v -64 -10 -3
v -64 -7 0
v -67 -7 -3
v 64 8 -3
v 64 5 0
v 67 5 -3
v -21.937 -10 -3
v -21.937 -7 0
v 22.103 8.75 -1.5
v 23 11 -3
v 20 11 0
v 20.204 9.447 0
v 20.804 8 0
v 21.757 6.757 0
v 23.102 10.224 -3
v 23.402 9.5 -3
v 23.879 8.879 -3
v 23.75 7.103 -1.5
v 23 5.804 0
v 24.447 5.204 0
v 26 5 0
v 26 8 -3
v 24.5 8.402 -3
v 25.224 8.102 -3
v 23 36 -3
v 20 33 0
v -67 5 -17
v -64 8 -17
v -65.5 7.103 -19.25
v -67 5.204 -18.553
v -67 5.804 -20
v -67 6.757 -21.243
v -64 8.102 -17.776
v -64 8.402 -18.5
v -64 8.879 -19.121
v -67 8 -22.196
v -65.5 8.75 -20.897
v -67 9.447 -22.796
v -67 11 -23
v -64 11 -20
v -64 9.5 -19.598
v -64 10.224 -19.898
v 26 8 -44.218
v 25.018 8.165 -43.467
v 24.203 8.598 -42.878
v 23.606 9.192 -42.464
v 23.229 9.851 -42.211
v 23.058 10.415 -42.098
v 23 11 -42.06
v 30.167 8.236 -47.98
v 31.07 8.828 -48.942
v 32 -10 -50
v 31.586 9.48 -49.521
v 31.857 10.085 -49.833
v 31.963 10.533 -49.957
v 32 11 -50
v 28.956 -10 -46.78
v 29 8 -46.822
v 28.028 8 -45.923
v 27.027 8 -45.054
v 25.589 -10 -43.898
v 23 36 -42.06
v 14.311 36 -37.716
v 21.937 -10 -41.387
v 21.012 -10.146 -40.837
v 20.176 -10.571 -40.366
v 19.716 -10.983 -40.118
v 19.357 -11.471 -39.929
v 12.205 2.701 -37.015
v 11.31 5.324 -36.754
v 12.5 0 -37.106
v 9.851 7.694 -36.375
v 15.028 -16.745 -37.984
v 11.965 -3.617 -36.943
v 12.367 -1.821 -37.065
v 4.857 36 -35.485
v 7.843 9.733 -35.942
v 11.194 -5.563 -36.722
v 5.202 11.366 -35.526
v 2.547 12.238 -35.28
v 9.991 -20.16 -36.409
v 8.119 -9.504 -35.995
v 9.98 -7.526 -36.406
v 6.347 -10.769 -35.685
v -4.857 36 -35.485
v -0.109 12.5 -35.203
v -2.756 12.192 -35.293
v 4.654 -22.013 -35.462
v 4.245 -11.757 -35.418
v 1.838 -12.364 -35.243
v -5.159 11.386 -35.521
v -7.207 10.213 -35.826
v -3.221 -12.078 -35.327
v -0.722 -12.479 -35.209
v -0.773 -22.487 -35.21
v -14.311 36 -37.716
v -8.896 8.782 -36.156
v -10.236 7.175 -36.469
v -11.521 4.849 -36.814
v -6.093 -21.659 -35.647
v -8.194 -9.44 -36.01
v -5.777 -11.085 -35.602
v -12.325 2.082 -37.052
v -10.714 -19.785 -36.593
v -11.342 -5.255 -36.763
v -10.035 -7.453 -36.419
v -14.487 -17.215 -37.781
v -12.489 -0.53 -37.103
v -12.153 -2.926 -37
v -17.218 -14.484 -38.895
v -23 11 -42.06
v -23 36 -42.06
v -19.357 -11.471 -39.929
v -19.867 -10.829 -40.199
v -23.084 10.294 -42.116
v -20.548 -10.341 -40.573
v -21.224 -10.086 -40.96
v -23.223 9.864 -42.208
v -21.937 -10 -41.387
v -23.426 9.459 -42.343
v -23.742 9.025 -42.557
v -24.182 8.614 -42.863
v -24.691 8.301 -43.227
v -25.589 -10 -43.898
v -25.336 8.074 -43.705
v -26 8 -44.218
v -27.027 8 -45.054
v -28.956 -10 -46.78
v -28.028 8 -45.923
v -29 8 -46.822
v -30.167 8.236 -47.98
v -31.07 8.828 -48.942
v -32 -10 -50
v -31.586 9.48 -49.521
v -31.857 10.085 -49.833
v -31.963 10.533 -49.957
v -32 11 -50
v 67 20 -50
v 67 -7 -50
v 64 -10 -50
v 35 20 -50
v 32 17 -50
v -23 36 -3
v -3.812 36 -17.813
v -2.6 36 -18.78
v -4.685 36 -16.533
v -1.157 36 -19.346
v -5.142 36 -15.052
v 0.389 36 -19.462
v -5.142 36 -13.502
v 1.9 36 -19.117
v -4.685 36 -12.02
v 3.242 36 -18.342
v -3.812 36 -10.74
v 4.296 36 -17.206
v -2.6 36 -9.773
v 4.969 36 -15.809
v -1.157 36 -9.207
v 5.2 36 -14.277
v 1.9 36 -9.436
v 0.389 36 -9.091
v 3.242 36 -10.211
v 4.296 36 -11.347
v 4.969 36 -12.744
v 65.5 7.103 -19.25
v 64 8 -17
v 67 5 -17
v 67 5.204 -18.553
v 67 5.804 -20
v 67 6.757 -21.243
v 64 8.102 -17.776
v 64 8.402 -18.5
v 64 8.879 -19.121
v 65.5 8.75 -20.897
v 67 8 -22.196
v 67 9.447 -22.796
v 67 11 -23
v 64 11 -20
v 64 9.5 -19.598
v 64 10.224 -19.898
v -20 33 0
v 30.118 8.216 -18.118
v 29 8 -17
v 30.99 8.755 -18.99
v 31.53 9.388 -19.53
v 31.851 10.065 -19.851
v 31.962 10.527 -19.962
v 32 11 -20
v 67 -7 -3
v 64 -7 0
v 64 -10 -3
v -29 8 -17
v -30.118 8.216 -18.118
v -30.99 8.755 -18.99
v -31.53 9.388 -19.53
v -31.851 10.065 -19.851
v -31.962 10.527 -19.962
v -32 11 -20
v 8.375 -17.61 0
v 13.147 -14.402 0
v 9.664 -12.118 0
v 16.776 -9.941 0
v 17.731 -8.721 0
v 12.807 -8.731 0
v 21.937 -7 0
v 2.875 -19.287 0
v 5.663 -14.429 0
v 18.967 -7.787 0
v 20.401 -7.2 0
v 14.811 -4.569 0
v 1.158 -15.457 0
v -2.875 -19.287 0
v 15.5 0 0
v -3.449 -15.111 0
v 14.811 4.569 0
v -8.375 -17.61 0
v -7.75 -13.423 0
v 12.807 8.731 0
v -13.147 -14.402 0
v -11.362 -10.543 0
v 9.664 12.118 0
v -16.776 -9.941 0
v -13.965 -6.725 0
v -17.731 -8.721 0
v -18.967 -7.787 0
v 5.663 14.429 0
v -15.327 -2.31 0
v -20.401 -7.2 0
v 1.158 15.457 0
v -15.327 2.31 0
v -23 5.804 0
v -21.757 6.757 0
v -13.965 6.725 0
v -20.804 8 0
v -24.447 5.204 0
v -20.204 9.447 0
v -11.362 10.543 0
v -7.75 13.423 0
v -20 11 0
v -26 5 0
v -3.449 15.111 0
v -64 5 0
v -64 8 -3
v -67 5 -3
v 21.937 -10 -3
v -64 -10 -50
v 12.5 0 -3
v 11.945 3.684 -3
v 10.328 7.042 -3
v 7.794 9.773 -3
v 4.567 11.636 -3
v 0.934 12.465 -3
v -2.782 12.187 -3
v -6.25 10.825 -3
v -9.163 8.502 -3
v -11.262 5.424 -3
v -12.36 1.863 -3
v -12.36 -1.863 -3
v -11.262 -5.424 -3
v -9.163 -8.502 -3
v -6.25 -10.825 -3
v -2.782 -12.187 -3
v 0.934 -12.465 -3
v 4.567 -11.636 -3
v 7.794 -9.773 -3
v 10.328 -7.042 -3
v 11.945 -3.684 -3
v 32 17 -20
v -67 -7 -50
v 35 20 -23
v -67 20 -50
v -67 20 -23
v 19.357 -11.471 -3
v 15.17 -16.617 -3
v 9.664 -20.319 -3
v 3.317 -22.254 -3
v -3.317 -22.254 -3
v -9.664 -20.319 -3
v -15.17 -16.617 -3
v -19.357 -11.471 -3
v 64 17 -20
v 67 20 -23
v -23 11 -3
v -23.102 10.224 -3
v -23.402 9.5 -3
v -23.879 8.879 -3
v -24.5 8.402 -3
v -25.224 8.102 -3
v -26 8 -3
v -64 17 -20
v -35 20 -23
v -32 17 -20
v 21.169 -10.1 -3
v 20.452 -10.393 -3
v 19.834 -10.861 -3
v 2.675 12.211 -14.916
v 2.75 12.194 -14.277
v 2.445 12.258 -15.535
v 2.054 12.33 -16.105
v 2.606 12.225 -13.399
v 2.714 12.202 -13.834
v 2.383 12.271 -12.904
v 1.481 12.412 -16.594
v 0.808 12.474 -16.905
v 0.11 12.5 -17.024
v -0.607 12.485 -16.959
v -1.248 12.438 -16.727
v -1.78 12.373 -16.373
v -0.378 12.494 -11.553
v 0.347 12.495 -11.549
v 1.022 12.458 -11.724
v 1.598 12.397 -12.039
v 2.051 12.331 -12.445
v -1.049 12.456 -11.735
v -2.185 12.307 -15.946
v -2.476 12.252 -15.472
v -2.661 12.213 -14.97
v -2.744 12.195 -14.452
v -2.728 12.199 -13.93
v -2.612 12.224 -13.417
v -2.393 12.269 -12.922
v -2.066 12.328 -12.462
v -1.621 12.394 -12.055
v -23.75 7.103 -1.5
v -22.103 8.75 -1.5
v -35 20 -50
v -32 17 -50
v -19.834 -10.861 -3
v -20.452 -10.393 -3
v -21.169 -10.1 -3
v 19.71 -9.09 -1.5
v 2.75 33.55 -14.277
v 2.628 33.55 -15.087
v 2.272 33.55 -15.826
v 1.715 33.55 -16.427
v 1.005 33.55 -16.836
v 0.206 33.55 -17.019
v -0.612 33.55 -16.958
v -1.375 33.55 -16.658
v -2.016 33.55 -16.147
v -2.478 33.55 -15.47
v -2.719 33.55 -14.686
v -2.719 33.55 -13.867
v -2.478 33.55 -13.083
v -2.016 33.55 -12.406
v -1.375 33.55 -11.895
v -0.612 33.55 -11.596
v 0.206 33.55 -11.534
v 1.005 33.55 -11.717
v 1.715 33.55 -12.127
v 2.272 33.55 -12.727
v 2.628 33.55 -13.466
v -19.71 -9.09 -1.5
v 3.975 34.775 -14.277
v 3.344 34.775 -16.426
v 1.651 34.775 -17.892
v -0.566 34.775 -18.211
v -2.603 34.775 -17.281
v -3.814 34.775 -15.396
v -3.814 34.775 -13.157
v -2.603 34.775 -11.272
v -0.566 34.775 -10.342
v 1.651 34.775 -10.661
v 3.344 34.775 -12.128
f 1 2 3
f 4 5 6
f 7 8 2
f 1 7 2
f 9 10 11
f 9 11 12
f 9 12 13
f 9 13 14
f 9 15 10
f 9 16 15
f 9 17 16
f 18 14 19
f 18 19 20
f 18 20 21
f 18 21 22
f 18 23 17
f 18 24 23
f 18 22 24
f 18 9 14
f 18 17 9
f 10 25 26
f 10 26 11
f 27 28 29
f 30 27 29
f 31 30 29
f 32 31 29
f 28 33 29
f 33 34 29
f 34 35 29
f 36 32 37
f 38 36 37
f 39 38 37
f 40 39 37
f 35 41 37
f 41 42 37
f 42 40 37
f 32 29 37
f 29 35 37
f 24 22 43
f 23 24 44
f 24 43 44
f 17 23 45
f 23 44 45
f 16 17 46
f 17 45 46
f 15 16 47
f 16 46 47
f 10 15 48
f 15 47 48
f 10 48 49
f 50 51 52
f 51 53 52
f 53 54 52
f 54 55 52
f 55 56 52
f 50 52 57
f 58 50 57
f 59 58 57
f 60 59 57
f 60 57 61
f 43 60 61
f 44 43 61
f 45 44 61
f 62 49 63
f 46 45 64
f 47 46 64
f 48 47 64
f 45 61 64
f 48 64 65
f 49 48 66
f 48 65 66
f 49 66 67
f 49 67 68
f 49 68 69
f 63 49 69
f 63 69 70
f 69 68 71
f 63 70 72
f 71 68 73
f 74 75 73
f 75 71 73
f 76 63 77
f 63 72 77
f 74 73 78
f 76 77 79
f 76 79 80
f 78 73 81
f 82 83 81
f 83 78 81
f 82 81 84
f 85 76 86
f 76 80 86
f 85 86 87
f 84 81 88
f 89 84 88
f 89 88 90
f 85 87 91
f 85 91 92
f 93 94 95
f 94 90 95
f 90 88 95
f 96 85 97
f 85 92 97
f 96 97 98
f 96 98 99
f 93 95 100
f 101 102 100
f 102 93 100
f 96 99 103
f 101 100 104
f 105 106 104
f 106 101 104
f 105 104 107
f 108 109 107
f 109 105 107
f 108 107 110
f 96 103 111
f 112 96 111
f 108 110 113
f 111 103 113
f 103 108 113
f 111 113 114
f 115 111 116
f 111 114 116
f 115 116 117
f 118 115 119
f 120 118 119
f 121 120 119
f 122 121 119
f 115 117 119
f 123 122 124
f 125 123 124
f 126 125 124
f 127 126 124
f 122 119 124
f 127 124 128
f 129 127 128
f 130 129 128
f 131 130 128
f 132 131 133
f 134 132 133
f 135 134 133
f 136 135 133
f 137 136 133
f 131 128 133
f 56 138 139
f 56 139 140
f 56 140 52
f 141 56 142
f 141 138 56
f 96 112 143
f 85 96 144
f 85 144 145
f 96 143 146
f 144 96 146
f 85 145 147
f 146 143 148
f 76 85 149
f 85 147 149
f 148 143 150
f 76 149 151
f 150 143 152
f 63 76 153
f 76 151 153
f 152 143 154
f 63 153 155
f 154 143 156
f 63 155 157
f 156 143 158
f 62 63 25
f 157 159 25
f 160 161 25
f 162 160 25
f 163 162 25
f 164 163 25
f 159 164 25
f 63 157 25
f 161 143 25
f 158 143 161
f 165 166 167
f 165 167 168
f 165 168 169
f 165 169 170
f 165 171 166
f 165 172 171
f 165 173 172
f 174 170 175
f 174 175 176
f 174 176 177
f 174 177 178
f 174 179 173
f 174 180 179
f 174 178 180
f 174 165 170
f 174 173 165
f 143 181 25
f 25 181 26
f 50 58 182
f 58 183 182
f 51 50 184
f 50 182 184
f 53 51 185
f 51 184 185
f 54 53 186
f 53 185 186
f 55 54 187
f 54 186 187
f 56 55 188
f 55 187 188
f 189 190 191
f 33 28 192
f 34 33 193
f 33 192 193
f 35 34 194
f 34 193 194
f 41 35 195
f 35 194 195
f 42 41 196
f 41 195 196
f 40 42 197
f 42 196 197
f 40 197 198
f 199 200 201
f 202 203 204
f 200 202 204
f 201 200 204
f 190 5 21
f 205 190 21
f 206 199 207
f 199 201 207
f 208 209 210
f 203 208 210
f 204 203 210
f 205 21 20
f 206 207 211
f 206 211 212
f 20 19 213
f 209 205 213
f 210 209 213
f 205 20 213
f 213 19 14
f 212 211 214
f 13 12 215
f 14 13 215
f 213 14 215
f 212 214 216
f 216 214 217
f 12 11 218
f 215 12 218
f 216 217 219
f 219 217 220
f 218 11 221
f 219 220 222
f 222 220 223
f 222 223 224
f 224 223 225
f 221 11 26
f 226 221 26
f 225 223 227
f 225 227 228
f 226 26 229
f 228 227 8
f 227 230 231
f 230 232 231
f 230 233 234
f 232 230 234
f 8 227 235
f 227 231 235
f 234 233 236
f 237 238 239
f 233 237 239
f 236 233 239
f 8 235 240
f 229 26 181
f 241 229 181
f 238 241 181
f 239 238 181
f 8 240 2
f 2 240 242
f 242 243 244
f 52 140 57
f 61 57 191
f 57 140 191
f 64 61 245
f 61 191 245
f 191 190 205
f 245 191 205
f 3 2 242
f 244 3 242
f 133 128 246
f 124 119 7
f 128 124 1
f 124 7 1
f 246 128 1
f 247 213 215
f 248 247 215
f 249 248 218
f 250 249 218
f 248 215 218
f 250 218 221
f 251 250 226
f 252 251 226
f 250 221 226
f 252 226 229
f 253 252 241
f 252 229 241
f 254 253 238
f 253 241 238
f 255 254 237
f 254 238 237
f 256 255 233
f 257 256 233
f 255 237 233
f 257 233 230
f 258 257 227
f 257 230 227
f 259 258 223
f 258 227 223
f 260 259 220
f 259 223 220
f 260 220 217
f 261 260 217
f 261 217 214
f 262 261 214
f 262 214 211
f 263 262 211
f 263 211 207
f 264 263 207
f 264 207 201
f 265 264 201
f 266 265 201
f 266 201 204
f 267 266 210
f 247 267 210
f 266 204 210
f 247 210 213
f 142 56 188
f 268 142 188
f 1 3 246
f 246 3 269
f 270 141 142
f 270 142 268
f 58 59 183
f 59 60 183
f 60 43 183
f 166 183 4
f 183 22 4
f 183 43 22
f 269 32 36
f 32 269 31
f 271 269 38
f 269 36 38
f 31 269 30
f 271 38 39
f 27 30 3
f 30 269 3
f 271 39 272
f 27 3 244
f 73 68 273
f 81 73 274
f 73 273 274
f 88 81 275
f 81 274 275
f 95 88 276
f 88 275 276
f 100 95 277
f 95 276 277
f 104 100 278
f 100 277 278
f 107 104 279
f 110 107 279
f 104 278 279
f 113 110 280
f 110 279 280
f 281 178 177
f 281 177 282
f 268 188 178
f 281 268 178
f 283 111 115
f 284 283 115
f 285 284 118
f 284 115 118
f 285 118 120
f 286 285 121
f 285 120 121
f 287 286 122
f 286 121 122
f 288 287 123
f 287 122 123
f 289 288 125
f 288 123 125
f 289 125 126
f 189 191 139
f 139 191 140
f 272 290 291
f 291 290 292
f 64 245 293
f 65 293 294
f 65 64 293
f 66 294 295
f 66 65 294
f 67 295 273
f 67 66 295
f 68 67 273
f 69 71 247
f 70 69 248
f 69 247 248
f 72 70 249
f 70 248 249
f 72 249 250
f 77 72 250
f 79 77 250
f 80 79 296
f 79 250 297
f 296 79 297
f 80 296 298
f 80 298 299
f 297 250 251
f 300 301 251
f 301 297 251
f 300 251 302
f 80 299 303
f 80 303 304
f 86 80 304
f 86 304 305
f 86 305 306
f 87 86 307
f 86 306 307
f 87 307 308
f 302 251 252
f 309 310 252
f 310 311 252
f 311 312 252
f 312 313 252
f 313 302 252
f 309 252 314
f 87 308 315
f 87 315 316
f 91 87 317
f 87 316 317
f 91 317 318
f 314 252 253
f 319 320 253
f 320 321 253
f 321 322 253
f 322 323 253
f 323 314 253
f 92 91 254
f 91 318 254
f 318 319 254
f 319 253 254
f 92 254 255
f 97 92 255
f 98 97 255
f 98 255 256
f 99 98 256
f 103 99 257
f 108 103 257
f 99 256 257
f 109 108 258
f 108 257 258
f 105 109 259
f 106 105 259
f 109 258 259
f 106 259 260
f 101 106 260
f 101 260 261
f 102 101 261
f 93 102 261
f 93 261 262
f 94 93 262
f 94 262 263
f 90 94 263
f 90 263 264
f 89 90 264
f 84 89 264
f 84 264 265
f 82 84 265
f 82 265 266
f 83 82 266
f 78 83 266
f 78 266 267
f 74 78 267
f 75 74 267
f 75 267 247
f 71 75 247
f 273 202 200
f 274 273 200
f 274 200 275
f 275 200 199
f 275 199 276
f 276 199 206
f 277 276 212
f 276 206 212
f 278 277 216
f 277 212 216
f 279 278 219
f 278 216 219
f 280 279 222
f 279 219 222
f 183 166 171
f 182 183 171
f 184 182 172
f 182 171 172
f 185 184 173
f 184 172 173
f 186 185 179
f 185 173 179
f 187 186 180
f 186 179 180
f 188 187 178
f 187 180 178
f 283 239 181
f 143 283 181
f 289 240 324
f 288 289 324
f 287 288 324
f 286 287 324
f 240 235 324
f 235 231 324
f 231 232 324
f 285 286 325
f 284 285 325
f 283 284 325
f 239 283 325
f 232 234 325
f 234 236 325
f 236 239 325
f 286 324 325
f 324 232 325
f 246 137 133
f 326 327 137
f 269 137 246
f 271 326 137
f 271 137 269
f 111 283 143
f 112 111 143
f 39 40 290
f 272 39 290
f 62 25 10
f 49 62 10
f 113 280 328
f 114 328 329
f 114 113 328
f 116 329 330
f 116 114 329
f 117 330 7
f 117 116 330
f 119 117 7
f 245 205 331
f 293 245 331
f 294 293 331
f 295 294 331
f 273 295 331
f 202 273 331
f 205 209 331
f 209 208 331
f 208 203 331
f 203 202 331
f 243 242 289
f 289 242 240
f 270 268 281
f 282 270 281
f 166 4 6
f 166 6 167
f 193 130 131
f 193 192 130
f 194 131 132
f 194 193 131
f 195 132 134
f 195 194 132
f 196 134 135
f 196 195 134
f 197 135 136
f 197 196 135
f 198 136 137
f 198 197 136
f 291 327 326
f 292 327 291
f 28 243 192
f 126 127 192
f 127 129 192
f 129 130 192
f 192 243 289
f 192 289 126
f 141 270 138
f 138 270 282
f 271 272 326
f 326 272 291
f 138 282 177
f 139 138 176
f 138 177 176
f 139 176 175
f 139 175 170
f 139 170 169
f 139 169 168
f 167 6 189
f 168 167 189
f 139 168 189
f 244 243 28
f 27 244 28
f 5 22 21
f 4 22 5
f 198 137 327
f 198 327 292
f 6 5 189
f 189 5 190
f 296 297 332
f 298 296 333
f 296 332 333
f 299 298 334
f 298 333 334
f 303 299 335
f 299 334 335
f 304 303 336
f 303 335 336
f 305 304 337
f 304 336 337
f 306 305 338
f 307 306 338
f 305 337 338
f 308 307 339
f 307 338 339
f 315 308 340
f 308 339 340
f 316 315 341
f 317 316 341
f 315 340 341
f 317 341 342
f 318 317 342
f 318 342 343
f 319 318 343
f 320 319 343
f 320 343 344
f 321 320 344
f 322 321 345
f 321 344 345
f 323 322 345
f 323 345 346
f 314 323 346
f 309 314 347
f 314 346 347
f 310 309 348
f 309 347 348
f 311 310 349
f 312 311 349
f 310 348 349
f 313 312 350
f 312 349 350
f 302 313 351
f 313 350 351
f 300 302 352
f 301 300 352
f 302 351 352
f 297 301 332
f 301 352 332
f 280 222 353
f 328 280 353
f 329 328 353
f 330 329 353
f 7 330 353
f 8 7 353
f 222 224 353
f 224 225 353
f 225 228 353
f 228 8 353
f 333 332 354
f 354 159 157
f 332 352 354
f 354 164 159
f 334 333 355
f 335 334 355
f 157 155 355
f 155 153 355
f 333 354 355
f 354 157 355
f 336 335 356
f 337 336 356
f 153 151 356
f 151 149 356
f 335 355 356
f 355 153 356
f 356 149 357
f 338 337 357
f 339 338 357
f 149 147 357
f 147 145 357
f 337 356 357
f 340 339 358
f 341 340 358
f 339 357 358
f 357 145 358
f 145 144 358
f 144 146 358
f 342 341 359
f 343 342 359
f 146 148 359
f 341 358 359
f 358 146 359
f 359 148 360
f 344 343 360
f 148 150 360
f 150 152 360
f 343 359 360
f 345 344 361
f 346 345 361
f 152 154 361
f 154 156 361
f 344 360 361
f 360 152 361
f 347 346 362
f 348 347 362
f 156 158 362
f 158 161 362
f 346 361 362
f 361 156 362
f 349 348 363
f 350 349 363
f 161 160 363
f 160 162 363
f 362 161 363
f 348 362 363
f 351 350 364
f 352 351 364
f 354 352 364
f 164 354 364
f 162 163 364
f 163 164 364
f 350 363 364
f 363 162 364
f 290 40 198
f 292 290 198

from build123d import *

# Parameters (mm, degrees)
SKETCH1_R               = 12.5
BOSS_EXTRUDE1_DEPTH     = 50
SKETCH2_W               = 35
SKETCH2_H               = 30
BOSS_EXTRUDE2_DEPTH     = 30
CUT_EXTRUDE1_DEPTH      = 92.021975369
CUT_EXTRUDE1_DEPTH_BACK = 92.021975369
FILLET2_R               = 3
CHAMFER1_SIZE           = 3


# Read off the part's stored shape, not the designer's step: Ø5.5 (5.5) Diameter Hole1
with BuildPart() as part:
    # Sketch1 → Boss-Extrude1 (new body)
    with BuildSketch(Plane.XY):
        with BuildLine():
            Line((23, 8), (67, 8))
            Line((67, 8), (67, -10))
            Line((67, -10), (20.155644371, -10))
            ThreePointArc((20.155644371, -10), (0, -22.5), (-20.155644371, -10))
            Line((-20.155644371, -10), (-67, -10))
            Line((-67, -10), (-67, 8))
            Line((-67, 8), (-23, 8))
            Line((-23, 8), (-23, 36))
            Line((-23, 36), (23, 36))
            Line((23, 36), (23, 8))
        make_face()
        Circle(SKETCH1_R, mode=Mode.SUBTRACT)
    extrude(amount=-BOSS_EXTRUDE1_DEPTH)

    # Sketch2 → Boss-Extrude2 (add)
    with BuildSketch(Plane.XZ.offset(10)):
        with Locations((49.5, -35)):
            Rectangle(SKETCH2_W, SKETCH2_H)
        with Locations((-49.5, -35)):
            Rectangle(SKETCH2_W, SKETCH2_H)
    extrude(amount=-BOSS_EXTRUDE2_DEPTH)

    # Sketch3 → Cut-Extrude1 (cut, two sides: drawn at the far end of the back side and taken through both)
    with BuildSketch(Plane(origin=(0, 0, 0), x_dir=(1, 0, 0), z_dir=(0, 1, 0)).offset(-CUT_EXTRUDE1_DEPTH_BACK)):
        with BuildLine():
            Line((-32, 50), (-32, 55))
            Line((-32, 55), (32, 55))
            Line((32, 55), (32, 50))
            ThreePointArc((32, 50), (0, 35.202941017), (-32, 50))
        make_face()
    extrude(amount=CUT_EXTRUDE1_DEPTH + CUT_EXTRUDE1_DEPTH_BACK, mode=Mode.SUBTRACT)

    # Ø5.5 (5.5) Diameter Hole1 outline → Ø5.5 (5.5) Diameter Hole1 (revolve, cut)
    with BuildSketch(Plane.XY.offset(-14.276580189)):
        Polygon((0, 12.193702386), (2.75, 12.193702386), (2.75, 33.55), (5.2, 36), (0, 36), align=None)
    revolve(axis=Axis((0, 0, -14.276580189), (0, 1, 0)), mode=Mode.SUBTRACT)

    # Fillet2
    fillet2_edges = [part.edges().sort_by_distance(p)[0] for p in [
        (49.5, 8, -20),
        (-49.5, 8, -20),
        (-32, 8, -35),
        (32, 8, -35),
        (23, 8, -21.030187118),
        (-23, 8, -21.030187118),
        (20.155644371, -10, -20.177640831),
        (-20.155644371, -10, -20.177640831),
    ]]
    fillet(fillet2_edges, radius=FILLET2_R)

    # Chamfer1
    chamfer1_edges = [part.edges().sort_by_distance(p)[0] for p in [
        (-23, 23.5, 0),
        (0, 36, 0),
        (46.5, 8, 0),
        (67, -1, 0),
        (67, 8, -8.5),
        (-67, 8, -8.5),
        (-46.5, 8, 0),
        (23, 23.5, 0),
        (0, -22.5, 0),
        (-44.468705484, -10, 0),
        (44.468705484, -10, 0),
        (67, 8.878679656, -19.121320344),
        (-67, 8.878679656, -19.121320344),
        (-67, -1, 0),
        (23.878679656, 8.878679656, 0),
        (-23.878679656, 8.878679656, 0),
        (20.452189654, -10.393447172, 0),
        (-20.452189654, -10.393447172, 0),
        (67, -10, -25),
        (-67, -10, -25),
        (-12.5, 0, 0),
        (67, 15.5, -20),
        (32, 20, -35),
        (49.5, 20, -20),
        (-32, 20, -35),
        (-67, 15.5, -20),
        (-49.5, 20, -20),
    ]]
    chamfer(chamfer1_edges, length=CHAMFER1_SIZE)


solid = part.part
